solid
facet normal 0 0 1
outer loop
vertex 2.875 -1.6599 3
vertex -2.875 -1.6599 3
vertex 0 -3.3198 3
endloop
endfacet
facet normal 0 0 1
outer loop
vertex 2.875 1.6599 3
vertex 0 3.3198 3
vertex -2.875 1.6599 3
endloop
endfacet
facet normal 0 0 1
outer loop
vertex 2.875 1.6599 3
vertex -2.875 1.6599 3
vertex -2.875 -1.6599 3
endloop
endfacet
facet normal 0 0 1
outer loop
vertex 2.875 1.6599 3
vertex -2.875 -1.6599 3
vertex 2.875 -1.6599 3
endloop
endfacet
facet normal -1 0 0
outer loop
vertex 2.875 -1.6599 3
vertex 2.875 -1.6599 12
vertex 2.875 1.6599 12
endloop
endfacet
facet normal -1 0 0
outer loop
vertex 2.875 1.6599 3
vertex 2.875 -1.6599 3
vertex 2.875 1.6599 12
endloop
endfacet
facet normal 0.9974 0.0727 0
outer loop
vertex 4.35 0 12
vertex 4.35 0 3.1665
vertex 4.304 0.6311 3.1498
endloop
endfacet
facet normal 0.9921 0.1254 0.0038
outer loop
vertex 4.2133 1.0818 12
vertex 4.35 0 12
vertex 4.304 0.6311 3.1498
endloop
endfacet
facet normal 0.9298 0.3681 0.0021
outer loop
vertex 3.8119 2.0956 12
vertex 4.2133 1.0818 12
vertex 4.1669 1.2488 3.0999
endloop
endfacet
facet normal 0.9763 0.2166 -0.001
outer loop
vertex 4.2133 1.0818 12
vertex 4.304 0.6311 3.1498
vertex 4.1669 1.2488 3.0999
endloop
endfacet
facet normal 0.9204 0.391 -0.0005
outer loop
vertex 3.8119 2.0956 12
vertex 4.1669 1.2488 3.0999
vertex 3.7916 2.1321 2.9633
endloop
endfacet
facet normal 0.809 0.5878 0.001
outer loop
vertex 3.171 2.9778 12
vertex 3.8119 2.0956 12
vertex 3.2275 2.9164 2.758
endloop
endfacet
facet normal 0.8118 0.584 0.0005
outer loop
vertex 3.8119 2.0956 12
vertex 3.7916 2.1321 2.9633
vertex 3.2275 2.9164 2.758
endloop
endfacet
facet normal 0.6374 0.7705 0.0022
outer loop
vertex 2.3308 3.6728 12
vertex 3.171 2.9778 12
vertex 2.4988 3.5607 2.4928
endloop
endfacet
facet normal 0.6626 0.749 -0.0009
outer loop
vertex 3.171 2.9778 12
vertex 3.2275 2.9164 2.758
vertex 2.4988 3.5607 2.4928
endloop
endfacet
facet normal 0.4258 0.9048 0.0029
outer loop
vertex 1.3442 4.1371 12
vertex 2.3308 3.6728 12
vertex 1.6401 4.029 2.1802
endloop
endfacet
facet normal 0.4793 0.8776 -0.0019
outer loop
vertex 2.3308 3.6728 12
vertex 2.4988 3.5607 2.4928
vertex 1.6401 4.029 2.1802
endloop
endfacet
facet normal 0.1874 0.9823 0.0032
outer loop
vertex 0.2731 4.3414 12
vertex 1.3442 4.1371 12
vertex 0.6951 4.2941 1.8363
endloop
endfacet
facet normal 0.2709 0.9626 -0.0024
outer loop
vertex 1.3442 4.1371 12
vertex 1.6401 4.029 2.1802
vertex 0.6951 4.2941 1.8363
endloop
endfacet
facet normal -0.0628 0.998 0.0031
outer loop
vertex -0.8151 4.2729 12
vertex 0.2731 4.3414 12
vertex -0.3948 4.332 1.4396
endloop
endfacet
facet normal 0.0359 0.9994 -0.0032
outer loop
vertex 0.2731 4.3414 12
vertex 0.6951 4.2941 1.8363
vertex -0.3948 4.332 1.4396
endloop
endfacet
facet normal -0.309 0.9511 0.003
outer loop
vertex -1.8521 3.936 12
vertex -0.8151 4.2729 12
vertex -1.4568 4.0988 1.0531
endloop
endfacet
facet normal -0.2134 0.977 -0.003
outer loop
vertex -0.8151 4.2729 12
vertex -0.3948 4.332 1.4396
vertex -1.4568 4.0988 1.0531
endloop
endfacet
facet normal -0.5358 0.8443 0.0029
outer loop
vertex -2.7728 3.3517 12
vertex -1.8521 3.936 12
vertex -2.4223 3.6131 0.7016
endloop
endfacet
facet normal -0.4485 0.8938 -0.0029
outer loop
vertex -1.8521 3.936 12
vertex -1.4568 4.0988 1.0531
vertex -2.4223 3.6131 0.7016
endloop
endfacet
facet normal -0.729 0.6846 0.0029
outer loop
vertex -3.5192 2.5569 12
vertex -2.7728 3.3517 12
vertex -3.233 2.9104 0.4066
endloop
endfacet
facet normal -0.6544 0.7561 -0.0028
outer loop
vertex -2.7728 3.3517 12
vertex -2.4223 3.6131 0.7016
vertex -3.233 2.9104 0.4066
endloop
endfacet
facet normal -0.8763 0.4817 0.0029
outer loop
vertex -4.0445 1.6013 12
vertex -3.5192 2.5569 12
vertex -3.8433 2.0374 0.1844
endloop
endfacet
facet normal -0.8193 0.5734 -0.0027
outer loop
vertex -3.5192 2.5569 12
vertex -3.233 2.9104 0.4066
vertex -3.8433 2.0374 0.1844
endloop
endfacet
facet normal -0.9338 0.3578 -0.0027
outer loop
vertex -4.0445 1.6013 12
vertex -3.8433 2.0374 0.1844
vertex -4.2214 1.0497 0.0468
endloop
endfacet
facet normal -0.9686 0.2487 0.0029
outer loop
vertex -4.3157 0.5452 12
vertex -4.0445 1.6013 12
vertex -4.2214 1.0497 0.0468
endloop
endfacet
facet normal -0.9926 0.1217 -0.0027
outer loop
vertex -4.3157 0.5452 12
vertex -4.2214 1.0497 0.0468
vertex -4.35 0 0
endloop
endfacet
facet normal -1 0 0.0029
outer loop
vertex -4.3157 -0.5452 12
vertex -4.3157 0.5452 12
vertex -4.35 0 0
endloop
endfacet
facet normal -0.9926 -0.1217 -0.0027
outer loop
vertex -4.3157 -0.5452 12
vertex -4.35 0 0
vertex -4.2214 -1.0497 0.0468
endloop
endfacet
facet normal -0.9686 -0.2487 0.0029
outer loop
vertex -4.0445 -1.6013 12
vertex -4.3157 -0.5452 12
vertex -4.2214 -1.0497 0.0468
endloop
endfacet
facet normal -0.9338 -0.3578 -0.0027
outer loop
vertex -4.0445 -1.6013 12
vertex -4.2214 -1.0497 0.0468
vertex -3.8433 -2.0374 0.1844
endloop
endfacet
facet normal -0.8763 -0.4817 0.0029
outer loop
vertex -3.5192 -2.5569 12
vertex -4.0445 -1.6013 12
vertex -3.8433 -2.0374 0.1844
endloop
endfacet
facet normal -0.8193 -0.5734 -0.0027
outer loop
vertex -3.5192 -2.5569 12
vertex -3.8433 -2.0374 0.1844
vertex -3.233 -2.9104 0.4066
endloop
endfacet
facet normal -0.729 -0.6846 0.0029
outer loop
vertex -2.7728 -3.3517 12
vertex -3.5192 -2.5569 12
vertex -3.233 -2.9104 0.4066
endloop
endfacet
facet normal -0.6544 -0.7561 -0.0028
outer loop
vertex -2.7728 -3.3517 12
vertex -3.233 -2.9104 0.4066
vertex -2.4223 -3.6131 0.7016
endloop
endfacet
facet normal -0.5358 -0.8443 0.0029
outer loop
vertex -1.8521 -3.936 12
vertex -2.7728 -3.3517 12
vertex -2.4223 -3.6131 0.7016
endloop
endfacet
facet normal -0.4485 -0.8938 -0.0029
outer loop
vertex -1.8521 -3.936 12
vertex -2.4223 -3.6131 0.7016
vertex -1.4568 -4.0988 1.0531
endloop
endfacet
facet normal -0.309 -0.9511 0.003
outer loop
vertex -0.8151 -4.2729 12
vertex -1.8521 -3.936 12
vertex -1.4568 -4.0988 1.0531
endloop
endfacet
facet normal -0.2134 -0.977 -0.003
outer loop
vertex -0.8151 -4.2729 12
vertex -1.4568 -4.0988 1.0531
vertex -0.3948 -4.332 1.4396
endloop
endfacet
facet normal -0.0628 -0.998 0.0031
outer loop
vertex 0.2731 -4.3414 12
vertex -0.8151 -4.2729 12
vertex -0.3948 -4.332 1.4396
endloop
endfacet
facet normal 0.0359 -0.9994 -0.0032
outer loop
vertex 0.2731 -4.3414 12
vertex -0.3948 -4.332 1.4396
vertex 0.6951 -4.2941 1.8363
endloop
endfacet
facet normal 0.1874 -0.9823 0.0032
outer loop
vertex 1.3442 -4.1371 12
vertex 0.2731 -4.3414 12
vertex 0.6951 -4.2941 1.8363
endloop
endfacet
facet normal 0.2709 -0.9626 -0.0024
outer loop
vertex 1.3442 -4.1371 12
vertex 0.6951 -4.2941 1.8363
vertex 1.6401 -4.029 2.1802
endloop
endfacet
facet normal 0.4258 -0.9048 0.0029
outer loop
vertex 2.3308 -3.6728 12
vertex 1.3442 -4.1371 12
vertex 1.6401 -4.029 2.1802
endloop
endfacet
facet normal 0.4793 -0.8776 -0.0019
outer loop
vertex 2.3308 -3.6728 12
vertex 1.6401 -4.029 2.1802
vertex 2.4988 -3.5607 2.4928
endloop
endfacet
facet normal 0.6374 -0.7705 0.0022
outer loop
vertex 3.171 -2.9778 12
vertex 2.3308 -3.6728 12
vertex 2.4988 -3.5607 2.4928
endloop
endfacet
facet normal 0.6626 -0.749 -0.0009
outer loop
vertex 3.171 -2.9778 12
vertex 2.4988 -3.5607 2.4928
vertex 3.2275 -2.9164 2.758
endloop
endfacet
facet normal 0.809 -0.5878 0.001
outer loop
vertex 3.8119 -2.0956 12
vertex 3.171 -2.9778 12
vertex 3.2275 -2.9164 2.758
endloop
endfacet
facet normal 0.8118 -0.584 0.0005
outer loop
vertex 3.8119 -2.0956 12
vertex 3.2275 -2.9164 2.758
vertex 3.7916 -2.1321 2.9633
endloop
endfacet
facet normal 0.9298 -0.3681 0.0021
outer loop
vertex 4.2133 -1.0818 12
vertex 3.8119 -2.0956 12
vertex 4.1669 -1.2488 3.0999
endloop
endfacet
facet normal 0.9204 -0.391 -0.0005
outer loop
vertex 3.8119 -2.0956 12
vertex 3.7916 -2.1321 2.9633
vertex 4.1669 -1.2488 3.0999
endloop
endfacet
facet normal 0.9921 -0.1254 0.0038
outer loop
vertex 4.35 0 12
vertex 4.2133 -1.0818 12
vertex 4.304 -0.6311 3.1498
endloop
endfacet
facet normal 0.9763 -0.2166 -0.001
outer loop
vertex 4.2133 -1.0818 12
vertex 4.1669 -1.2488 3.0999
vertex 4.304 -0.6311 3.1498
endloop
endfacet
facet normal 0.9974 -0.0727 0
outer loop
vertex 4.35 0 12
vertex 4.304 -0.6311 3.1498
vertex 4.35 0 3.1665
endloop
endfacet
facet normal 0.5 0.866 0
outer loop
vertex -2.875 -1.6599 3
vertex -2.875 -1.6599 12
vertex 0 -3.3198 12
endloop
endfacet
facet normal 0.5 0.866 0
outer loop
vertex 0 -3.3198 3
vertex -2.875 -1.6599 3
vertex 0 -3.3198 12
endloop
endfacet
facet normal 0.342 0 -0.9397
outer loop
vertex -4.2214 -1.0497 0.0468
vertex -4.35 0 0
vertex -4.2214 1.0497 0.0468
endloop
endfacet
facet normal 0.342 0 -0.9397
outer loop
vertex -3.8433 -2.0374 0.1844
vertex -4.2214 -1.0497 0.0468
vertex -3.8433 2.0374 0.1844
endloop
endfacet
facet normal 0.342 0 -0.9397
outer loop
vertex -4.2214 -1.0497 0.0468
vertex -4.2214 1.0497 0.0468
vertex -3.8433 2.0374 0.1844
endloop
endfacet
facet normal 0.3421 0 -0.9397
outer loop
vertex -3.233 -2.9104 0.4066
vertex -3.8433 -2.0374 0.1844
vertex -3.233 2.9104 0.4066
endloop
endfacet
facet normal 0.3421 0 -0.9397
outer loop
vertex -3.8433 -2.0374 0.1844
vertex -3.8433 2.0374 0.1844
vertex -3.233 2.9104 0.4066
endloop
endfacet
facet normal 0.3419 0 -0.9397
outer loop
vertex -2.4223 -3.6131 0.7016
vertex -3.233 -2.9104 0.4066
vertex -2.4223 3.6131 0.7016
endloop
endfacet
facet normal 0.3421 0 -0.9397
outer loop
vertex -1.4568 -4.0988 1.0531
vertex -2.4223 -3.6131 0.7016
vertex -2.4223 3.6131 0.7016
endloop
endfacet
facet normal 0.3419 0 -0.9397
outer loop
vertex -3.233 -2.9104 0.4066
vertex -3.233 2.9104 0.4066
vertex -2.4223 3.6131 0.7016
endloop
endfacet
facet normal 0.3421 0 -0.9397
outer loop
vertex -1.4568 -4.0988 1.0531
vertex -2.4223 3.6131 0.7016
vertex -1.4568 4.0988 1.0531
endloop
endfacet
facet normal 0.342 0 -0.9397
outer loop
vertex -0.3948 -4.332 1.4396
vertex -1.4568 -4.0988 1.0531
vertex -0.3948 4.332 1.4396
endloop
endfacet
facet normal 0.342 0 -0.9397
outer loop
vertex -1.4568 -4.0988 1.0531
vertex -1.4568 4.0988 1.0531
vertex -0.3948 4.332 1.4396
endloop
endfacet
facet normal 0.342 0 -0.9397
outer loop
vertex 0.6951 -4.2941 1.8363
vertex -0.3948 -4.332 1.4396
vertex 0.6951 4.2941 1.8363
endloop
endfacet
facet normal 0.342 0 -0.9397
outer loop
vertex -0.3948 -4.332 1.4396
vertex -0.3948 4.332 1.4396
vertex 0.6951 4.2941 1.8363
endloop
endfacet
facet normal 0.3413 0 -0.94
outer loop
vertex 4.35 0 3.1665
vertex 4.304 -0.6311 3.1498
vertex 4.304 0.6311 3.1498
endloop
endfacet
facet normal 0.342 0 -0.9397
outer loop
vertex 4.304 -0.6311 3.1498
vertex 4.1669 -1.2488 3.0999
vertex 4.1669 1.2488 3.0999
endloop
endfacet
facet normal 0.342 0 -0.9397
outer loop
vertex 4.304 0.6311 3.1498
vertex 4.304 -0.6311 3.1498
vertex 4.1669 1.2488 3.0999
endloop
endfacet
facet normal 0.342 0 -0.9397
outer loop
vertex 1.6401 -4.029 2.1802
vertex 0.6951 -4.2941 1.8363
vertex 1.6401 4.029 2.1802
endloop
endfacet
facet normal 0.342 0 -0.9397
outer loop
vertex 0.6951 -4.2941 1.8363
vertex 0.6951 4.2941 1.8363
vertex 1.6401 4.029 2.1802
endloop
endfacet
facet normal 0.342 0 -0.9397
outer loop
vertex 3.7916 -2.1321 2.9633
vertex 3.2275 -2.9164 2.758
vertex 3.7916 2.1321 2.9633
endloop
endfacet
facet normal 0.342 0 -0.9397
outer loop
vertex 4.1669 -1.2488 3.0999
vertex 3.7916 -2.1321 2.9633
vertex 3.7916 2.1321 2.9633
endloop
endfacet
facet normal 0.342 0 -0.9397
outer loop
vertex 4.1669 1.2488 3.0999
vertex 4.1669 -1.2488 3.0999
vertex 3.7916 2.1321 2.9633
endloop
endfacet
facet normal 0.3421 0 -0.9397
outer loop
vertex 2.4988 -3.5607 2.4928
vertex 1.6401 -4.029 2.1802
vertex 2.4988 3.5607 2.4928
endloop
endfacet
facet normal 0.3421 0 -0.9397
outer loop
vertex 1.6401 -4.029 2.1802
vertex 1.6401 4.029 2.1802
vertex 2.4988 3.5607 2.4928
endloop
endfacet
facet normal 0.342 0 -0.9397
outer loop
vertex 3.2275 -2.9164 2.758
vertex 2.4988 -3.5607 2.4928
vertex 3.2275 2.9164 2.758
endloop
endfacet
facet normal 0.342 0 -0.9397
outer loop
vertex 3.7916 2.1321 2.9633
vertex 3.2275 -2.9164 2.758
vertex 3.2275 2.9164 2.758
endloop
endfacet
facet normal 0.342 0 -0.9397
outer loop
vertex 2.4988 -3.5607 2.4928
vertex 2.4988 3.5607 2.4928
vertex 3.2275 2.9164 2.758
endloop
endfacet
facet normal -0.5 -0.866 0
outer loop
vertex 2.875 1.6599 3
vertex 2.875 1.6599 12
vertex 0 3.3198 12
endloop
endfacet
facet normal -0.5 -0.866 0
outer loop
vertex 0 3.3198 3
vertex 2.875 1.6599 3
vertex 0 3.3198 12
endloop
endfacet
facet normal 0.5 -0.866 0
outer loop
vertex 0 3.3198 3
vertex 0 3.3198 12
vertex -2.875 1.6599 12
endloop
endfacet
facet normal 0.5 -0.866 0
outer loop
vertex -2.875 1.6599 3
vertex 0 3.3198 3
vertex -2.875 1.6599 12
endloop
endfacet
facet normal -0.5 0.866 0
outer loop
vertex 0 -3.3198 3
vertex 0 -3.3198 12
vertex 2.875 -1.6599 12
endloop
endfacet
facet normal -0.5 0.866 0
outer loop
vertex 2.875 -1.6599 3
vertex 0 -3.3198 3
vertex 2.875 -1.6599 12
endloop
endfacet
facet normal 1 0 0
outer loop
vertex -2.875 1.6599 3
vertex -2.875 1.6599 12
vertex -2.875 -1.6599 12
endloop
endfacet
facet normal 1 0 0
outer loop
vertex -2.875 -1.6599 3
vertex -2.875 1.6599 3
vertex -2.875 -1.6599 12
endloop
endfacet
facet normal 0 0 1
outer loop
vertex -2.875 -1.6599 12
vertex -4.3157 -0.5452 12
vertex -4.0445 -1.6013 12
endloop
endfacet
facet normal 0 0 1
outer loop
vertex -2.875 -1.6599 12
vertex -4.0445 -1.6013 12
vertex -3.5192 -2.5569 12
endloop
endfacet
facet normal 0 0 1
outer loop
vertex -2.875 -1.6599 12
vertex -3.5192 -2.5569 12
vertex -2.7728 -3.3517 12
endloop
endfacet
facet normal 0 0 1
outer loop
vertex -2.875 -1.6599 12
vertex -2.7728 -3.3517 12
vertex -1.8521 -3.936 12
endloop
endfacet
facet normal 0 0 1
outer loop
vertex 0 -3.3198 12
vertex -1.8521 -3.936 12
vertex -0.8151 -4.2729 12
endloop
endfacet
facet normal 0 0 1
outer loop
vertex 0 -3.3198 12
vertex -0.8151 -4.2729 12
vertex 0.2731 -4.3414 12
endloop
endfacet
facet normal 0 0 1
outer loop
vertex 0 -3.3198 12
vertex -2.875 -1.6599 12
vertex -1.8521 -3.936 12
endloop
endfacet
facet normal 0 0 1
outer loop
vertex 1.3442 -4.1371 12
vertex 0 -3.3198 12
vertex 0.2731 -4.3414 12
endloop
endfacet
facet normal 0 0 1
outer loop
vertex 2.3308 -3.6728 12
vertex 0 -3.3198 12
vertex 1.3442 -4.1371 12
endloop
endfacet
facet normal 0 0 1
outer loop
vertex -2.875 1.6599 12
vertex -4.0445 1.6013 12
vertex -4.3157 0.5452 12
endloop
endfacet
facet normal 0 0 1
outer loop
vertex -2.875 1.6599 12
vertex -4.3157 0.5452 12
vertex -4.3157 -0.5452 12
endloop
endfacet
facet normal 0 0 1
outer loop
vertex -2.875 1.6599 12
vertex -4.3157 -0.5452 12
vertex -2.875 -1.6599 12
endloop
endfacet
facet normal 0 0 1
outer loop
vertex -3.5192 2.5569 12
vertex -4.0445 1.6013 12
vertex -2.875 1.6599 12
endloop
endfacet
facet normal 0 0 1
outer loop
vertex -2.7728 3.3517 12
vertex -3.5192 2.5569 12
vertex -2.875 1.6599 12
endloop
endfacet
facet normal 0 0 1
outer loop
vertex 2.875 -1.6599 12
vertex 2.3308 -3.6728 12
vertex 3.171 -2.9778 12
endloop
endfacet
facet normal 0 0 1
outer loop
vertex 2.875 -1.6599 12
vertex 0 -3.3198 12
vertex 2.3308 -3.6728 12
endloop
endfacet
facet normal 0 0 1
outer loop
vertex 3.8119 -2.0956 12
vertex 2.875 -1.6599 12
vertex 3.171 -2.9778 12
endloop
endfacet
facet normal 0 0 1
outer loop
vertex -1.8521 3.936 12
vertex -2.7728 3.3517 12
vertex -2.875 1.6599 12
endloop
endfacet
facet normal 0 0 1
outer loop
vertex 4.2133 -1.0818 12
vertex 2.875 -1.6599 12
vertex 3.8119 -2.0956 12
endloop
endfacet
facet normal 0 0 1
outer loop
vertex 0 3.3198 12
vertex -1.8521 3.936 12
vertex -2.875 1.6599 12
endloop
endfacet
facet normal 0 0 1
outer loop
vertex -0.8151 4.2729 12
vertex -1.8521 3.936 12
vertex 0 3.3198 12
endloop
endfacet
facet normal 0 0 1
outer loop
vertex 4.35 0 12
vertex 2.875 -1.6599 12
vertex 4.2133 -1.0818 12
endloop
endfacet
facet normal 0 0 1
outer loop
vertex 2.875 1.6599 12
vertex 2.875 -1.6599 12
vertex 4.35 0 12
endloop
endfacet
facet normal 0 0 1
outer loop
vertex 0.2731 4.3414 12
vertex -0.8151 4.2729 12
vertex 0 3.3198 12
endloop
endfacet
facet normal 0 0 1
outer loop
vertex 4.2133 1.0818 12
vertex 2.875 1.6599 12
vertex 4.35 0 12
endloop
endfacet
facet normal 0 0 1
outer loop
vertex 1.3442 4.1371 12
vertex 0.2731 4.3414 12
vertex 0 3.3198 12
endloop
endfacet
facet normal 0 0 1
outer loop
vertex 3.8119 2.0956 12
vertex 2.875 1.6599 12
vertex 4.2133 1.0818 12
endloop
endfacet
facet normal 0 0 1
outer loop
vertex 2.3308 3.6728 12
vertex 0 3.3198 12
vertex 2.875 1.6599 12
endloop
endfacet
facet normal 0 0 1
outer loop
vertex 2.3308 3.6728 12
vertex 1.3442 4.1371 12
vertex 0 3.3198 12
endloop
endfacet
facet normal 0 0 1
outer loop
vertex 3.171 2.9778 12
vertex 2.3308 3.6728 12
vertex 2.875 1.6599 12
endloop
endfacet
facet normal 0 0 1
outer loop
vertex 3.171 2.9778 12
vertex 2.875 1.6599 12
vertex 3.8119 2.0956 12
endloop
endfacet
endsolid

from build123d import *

# Parameters (mm, degrees)
SKETCH_1_R                        = 4.35
EXTRUDE_1_DEPTH                   = 12
CUT_EXTRUDE_480_DEPTH             = 9
CUT_EXTRUDE_727_REACH             = 15.485
CUT_EXTRUDE_727_DIRECTION_2_REACH = 15.485


with BuildPart() as part:
    # Эскиз1 → Бобышка-Вытянуть1 (new body)
    with BuildSketch(Plane.XY):
        Circle(SKETCH_1_R)
    extrude(amount=EXTRUDE_1_DEPTH)

    # Эскиз2 → Cut-Extrude 480 (cut)
    with BuildSketch(Plane.XY.offset(12)):
        Polygon((0, 3.319764048), (-2.875, 1.659882024), (-2.875, -1.659882024), (0, -3.319764048), (2.875, -1.659882024), (2.875, 1.659882024), align=None)
    extrude(amount=-CUT_EXTRUDE_480_DEPTH, mode=Mode.SUBTRACT)

    # Эскиз3 → Cut-Extrude 727 (cut, up to next)
    with BuildSketch(Plane(origin=(0, 0, 0), x_dir=(1, 0, 0), z_dir=(0, 1, 0)), mode=Mode.PRIVATE) as cut_extrude_727_sk1:
        Polygon((-4.35, 0), (4.35, -3.166541038), (4.35, 0), align=None)
    cut_extrude_727_tool1 = extrude(cut_extrude_727_sk1.sketch, amount=-CUT_EXTRUDE_727_REACH, mode=Mode.PRIVATE) & part.part
    add(cut_extrude_727_tool1.solids().sort_by_distance((1.45, 0, 1.055514))[0], mode=Mode.SUBTRACT)

    # Эскиз3 → Cut-Extrude 727 direction 2 (cut, up to next)
    with BuildSketch(Plane(origin=(0, 0, 0), x_dir=(1, 0, 0), z_dir=(0, 1, 0)), mode=Mode.PRIVATE) as cut_extrude_727_direction_2_sk1:
        Polygon((-4.35, 0), (4.35, -3.166541038), (4.35, 0), align=None)
    cut_extrude_727_direction_2_tool1 = extrude(cut_extrude_727_direction_2_sk1.sketch, amount=CUT_EXTRUDE_727_DIRECTION_2_REACH, mode=Mode.PRIVATE) & part.part
    add(cut_extrude_727_direction_2_tool1.solids().sort_by_distance((1.45, 0, 1.055514))[0], mode=Mode.SUBTRACT)


solid = part.part
